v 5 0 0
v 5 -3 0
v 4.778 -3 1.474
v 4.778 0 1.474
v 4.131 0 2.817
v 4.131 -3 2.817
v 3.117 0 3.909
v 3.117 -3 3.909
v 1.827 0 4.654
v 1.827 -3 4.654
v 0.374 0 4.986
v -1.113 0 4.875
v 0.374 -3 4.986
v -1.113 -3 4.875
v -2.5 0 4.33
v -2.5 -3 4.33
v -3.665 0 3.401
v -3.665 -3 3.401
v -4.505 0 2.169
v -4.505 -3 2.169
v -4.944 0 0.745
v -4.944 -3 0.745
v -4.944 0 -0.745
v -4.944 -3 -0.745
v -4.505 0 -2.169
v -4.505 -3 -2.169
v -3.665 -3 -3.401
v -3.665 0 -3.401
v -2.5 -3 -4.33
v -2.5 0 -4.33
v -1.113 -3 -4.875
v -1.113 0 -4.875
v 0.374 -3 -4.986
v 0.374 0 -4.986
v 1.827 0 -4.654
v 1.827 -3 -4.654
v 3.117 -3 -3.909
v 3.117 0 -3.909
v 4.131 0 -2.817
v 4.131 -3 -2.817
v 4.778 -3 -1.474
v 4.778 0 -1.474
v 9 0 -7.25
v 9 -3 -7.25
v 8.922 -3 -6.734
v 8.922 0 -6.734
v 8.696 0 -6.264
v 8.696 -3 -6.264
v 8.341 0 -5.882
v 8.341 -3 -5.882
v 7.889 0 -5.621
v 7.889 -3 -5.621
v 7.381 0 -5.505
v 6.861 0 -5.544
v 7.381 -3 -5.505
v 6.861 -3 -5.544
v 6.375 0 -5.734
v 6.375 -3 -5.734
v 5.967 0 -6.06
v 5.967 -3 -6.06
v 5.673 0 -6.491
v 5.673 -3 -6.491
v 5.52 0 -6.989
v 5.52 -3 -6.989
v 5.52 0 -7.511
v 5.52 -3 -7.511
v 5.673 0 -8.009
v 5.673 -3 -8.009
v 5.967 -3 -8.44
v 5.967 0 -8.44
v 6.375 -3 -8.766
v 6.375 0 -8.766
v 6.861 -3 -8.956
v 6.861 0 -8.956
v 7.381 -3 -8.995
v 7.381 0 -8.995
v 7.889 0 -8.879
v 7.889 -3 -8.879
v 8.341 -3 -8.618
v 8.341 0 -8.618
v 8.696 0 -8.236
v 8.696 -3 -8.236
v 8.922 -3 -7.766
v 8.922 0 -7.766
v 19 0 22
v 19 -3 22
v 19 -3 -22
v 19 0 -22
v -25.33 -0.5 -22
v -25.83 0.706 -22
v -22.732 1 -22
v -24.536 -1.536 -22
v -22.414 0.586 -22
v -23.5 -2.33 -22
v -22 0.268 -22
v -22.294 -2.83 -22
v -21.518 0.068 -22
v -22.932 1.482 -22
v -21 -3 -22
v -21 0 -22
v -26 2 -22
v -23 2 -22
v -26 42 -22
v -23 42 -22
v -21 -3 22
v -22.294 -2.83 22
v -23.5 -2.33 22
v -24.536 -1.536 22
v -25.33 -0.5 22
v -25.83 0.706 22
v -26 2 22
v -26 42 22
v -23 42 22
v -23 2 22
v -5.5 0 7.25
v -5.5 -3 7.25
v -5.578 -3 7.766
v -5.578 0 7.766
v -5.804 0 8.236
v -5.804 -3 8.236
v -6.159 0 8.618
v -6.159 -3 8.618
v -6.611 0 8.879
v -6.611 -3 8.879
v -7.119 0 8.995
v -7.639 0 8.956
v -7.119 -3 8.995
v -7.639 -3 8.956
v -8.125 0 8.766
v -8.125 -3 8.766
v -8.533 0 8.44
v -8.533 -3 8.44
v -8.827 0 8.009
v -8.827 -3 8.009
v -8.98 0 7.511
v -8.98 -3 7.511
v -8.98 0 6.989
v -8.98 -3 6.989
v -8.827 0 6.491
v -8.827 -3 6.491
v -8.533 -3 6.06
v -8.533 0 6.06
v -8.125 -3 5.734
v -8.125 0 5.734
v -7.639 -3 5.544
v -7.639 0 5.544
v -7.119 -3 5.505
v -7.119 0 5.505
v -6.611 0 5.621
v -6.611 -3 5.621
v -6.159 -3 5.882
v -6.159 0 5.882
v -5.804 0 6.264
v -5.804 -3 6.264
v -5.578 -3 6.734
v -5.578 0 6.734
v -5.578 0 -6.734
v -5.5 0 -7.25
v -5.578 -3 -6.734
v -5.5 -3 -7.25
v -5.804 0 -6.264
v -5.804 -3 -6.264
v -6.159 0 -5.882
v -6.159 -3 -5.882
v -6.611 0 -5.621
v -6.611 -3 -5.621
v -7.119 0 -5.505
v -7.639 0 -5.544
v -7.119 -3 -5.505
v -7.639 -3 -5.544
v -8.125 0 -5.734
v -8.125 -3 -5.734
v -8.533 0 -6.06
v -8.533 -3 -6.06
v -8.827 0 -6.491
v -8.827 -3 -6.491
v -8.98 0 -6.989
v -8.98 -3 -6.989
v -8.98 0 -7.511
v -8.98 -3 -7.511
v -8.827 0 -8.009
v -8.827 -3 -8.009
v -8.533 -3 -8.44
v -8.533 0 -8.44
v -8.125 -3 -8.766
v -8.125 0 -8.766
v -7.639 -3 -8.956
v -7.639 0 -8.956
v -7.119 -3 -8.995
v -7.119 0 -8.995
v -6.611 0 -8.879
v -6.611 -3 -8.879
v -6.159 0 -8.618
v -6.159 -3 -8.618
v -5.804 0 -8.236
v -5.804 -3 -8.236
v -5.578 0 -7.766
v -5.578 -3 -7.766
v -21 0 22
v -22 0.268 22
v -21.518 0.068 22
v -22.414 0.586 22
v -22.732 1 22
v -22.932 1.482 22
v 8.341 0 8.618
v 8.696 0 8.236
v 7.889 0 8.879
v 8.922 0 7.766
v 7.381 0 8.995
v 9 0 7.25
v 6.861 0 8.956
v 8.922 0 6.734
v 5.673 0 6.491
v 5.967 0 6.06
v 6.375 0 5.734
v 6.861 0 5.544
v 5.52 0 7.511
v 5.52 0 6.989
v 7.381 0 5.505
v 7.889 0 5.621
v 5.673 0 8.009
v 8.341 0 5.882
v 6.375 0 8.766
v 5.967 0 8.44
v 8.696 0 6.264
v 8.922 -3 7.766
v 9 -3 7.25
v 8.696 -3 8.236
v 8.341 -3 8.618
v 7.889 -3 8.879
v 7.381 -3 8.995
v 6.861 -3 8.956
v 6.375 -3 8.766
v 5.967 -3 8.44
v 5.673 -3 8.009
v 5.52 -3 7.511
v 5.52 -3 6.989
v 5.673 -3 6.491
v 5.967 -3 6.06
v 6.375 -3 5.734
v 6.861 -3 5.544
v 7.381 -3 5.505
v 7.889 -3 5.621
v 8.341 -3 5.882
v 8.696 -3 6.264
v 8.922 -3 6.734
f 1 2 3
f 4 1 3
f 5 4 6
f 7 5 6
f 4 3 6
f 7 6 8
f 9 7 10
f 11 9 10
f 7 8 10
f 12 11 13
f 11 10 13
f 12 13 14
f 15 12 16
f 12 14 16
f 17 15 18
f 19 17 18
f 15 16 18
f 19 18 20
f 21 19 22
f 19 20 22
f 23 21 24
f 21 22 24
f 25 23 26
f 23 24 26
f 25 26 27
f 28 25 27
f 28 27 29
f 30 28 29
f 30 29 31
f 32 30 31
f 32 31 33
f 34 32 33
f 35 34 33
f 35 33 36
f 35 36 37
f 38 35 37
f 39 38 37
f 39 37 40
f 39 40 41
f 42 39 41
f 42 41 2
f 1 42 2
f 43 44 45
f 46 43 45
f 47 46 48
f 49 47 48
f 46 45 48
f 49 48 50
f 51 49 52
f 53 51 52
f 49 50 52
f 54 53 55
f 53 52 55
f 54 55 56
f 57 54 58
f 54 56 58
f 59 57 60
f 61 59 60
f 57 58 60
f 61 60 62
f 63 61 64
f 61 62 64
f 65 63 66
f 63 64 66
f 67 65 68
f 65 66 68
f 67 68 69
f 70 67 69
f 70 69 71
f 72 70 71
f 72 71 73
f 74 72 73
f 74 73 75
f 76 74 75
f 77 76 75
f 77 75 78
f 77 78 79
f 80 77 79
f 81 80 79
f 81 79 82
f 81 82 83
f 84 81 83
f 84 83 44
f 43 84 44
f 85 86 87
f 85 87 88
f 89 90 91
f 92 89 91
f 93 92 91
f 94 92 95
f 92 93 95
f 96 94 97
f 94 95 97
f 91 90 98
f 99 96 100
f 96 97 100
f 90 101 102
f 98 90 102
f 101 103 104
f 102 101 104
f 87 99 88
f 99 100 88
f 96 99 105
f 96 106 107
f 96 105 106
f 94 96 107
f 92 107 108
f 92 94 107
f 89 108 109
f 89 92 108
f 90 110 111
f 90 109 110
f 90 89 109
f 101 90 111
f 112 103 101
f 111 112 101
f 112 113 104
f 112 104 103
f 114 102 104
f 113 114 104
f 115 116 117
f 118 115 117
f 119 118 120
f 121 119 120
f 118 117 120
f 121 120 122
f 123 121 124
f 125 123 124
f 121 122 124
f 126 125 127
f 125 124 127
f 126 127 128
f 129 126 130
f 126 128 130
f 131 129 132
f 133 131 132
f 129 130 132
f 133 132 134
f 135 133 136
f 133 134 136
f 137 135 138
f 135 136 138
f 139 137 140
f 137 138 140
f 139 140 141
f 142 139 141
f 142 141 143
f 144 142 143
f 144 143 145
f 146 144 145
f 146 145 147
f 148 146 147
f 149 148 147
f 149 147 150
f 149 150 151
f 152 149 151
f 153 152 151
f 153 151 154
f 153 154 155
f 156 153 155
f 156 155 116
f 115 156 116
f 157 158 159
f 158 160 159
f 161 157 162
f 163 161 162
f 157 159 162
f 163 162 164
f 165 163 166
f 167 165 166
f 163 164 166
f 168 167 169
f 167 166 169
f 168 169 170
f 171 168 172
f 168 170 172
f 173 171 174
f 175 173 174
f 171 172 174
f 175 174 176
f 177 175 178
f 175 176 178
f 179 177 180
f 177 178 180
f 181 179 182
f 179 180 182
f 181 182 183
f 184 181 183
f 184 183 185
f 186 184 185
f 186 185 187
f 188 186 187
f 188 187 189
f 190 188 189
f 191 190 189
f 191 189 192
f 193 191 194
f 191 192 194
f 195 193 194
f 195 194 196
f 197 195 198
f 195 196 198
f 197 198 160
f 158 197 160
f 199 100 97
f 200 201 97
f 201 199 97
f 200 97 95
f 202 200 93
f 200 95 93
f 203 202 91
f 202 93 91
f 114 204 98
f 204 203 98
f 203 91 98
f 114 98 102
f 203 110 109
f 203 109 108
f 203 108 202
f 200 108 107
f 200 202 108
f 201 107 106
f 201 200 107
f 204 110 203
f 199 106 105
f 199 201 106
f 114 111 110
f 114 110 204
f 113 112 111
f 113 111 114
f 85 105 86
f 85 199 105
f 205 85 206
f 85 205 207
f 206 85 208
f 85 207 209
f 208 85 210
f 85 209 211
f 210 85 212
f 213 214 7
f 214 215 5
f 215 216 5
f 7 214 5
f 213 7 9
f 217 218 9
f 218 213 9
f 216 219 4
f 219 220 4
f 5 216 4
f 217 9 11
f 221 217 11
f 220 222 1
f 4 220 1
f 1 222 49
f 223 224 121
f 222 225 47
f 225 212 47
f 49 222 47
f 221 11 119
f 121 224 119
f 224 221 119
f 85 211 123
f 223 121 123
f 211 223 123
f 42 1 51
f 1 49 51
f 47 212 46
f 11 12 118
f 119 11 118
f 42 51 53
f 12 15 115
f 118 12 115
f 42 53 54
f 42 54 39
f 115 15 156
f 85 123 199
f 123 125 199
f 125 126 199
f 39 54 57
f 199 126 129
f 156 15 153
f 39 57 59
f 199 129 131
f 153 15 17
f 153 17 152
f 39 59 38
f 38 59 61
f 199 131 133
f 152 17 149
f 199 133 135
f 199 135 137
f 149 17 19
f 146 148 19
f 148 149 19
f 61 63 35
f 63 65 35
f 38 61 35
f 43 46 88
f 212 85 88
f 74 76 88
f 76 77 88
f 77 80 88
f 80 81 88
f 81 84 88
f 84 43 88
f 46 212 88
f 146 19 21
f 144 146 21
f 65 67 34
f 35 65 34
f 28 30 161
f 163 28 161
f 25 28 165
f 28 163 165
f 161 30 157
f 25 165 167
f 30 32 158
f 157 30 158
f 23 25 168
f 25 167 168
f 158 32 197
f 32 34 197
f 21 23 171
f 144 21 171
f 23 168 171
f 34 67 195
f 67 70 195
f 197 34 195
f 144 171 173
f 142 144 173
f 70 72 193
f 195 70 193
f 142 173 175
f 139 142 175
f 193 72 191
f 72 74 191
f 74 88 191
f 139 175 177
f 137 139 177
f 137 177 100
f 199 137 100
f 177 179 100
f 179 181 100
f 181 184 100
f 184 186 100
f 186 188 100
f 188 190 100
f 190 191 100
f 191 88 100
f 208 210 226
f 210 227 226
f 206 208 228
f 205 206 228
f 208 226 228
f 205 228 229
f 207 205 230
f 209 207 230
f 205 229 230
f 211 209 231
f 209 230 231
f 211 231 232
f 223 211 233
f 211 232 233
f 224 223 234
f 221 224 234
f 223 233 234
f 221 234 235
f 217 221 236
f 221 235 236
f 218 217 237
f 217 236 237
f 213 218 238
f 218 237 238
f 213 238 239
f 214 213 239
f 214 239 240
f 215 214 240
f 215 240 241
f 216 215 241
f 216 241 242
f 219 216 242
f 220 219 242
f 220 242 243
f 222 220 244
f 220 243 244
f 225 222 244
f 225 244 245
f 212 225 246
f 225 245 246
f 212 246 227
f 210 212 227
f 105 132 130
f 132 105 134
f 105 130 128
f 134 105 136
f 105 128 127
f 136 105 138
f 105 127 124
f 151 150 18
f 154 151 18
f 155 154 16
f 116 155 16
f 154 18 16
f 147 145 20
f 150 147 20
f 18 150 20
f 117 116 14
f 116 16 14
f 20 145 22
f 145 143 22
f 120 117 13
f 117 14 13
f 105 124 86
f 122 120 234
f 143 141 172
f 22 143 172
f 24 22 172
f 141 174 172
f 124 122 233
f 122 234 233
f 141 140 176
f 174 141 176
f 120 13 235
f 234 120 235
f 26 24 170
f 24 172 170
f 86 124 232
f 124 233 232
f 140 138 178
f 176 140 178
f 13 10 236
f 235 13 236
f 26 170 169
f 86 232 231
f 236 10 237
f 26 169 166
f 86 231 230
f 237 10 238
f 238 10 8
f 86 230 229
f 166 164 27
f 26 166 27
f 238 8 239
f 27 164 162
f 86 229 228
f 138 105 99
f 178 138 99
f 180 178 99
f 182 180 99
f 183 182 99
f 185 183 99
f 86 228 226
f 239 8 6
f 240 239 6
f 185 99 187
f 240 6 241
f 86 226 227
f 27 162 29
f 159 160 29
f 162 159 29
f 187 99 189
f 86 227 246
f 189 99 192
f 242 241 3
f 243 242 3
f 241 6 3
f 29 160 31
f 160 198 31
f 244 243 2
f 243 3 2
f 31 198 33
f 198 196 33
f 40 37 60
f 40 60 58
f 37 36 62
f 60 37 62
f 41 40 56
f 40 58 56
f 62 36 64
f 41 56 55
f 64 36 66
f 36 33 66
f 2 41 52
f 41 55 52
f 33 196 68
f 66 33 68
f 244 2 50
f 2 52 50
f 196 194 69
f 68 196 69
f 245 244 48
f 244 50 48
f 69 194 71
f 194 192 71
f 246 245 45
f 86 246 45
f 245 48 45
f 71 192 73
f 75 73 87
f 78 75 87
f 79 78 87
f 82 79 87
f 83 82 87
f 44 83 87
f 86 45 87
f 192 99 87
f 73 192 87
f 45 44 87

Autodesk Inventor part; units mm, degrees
ref_plane "YZ Plane" through (0, 0, 0) normal (1, 0, 0) x (0, 1, 0)
ref_plane "XZ Plane" through (0, 0, 0) normal (0, 1, 0) x (-1, 0, 0)
ref_plane "XY Plane" through (0, 0, 0) normal (0, 0, 1) x (1, 0, 0)
sketch "Sketch1" plane through (0, 0, 0) normal (0, 0, 1) x (1, 0, 0)
  line L0 (19, 0) -> (-21, 0)
  line L1 (-26, 0) -> (-26, -3)
  line L2 (-26, -3) -> (19, -3)
  line L3 (19, -3) -> (19, 0)
  line L4 (-26, -3) -> (-23, -3)
  line L5 (-23, 2) -> (-23, 42)
  line L6 (-23, 42) -> (-26, 42)
  line L7 (-26, 42) -> (-26, -3)
  arc A0 (-23, 2) -> (-21, 0) centre (-21, 2) ccw
  arc A1 (-26, 2) -> (-21, -3) centre (-21, 2) ccw
  point P0 (0, 0)
  point P1 (19, -1.5)
  dimension "d0" = 45
  dimension "d1" = 19
  dimension "d2" = 45
  dimension "d3" = 3
  dimension "d4" = 3
  dimension "d5" = 2
extrude "Extrusion1" add sketch "Sketch1" along normal mid plane 44 contours L3 L2 A1 L7 L6 L5 A0 L0
sketch "Sketch2" plane through (-21, -3, 22) normal (0, -1, 0) x (1, 0, 0)
  circle A0 centre (21, -22) radius 5
  dimension "d8" = 10
extrude "Extrusion2" cut sketch "Sketch2" against normal through all
sketch "Sketch3" plane through (-21, -3, 22) normal (0, -1, 0) x (1, 0, 0)
  point P0 (21, -22)
sketch "Sketch4" plane through (-21, -3, 22) normal (0, -1, 0) x (1, 0, 0)
  line L0 (28.25, -14.75) -> (13.75, -14.75) construction
  line L1 (13.75, -14.75) -> (13.75, -29.25) construction
  line L2 (13.75, -29.25) -> (28.25, -29.25) construction
  line L3 (28.25, -29.25) -> (28.25, -14.75) construction
  line L4 (28.25, -14.75) -> (13.75, -29.25) construction
  line L5 (13.75, -14.75) -> (28.25, -29.25) construction
  circle A0 centre (28.25, -29.25) radius 1.75
  circle A1 centre (13.75, -29.25) radius 1.75
  circle A2 centre (13.75, -14.75) radius 1.75
  circle A3 centre (28.25, -14.75) radius 1.75
  point P0 (21, -22)
  dimension "d11" = 14.5
  dimension "d12" = 14.5
  dimension "d13" = 3.5
  dimension "d14" = 3.5
  dimension "d15" = 3.5
  dimension "d16" = 3.5
extrude "Extrusion3" cut sketch "Sketch4" against normal up to surface (3 mm away)
equation "\"d14\" = d13"
equation "\"d15\" = d13"
equation "\"d16\" = d13"
properties part number "Angle_motor"
